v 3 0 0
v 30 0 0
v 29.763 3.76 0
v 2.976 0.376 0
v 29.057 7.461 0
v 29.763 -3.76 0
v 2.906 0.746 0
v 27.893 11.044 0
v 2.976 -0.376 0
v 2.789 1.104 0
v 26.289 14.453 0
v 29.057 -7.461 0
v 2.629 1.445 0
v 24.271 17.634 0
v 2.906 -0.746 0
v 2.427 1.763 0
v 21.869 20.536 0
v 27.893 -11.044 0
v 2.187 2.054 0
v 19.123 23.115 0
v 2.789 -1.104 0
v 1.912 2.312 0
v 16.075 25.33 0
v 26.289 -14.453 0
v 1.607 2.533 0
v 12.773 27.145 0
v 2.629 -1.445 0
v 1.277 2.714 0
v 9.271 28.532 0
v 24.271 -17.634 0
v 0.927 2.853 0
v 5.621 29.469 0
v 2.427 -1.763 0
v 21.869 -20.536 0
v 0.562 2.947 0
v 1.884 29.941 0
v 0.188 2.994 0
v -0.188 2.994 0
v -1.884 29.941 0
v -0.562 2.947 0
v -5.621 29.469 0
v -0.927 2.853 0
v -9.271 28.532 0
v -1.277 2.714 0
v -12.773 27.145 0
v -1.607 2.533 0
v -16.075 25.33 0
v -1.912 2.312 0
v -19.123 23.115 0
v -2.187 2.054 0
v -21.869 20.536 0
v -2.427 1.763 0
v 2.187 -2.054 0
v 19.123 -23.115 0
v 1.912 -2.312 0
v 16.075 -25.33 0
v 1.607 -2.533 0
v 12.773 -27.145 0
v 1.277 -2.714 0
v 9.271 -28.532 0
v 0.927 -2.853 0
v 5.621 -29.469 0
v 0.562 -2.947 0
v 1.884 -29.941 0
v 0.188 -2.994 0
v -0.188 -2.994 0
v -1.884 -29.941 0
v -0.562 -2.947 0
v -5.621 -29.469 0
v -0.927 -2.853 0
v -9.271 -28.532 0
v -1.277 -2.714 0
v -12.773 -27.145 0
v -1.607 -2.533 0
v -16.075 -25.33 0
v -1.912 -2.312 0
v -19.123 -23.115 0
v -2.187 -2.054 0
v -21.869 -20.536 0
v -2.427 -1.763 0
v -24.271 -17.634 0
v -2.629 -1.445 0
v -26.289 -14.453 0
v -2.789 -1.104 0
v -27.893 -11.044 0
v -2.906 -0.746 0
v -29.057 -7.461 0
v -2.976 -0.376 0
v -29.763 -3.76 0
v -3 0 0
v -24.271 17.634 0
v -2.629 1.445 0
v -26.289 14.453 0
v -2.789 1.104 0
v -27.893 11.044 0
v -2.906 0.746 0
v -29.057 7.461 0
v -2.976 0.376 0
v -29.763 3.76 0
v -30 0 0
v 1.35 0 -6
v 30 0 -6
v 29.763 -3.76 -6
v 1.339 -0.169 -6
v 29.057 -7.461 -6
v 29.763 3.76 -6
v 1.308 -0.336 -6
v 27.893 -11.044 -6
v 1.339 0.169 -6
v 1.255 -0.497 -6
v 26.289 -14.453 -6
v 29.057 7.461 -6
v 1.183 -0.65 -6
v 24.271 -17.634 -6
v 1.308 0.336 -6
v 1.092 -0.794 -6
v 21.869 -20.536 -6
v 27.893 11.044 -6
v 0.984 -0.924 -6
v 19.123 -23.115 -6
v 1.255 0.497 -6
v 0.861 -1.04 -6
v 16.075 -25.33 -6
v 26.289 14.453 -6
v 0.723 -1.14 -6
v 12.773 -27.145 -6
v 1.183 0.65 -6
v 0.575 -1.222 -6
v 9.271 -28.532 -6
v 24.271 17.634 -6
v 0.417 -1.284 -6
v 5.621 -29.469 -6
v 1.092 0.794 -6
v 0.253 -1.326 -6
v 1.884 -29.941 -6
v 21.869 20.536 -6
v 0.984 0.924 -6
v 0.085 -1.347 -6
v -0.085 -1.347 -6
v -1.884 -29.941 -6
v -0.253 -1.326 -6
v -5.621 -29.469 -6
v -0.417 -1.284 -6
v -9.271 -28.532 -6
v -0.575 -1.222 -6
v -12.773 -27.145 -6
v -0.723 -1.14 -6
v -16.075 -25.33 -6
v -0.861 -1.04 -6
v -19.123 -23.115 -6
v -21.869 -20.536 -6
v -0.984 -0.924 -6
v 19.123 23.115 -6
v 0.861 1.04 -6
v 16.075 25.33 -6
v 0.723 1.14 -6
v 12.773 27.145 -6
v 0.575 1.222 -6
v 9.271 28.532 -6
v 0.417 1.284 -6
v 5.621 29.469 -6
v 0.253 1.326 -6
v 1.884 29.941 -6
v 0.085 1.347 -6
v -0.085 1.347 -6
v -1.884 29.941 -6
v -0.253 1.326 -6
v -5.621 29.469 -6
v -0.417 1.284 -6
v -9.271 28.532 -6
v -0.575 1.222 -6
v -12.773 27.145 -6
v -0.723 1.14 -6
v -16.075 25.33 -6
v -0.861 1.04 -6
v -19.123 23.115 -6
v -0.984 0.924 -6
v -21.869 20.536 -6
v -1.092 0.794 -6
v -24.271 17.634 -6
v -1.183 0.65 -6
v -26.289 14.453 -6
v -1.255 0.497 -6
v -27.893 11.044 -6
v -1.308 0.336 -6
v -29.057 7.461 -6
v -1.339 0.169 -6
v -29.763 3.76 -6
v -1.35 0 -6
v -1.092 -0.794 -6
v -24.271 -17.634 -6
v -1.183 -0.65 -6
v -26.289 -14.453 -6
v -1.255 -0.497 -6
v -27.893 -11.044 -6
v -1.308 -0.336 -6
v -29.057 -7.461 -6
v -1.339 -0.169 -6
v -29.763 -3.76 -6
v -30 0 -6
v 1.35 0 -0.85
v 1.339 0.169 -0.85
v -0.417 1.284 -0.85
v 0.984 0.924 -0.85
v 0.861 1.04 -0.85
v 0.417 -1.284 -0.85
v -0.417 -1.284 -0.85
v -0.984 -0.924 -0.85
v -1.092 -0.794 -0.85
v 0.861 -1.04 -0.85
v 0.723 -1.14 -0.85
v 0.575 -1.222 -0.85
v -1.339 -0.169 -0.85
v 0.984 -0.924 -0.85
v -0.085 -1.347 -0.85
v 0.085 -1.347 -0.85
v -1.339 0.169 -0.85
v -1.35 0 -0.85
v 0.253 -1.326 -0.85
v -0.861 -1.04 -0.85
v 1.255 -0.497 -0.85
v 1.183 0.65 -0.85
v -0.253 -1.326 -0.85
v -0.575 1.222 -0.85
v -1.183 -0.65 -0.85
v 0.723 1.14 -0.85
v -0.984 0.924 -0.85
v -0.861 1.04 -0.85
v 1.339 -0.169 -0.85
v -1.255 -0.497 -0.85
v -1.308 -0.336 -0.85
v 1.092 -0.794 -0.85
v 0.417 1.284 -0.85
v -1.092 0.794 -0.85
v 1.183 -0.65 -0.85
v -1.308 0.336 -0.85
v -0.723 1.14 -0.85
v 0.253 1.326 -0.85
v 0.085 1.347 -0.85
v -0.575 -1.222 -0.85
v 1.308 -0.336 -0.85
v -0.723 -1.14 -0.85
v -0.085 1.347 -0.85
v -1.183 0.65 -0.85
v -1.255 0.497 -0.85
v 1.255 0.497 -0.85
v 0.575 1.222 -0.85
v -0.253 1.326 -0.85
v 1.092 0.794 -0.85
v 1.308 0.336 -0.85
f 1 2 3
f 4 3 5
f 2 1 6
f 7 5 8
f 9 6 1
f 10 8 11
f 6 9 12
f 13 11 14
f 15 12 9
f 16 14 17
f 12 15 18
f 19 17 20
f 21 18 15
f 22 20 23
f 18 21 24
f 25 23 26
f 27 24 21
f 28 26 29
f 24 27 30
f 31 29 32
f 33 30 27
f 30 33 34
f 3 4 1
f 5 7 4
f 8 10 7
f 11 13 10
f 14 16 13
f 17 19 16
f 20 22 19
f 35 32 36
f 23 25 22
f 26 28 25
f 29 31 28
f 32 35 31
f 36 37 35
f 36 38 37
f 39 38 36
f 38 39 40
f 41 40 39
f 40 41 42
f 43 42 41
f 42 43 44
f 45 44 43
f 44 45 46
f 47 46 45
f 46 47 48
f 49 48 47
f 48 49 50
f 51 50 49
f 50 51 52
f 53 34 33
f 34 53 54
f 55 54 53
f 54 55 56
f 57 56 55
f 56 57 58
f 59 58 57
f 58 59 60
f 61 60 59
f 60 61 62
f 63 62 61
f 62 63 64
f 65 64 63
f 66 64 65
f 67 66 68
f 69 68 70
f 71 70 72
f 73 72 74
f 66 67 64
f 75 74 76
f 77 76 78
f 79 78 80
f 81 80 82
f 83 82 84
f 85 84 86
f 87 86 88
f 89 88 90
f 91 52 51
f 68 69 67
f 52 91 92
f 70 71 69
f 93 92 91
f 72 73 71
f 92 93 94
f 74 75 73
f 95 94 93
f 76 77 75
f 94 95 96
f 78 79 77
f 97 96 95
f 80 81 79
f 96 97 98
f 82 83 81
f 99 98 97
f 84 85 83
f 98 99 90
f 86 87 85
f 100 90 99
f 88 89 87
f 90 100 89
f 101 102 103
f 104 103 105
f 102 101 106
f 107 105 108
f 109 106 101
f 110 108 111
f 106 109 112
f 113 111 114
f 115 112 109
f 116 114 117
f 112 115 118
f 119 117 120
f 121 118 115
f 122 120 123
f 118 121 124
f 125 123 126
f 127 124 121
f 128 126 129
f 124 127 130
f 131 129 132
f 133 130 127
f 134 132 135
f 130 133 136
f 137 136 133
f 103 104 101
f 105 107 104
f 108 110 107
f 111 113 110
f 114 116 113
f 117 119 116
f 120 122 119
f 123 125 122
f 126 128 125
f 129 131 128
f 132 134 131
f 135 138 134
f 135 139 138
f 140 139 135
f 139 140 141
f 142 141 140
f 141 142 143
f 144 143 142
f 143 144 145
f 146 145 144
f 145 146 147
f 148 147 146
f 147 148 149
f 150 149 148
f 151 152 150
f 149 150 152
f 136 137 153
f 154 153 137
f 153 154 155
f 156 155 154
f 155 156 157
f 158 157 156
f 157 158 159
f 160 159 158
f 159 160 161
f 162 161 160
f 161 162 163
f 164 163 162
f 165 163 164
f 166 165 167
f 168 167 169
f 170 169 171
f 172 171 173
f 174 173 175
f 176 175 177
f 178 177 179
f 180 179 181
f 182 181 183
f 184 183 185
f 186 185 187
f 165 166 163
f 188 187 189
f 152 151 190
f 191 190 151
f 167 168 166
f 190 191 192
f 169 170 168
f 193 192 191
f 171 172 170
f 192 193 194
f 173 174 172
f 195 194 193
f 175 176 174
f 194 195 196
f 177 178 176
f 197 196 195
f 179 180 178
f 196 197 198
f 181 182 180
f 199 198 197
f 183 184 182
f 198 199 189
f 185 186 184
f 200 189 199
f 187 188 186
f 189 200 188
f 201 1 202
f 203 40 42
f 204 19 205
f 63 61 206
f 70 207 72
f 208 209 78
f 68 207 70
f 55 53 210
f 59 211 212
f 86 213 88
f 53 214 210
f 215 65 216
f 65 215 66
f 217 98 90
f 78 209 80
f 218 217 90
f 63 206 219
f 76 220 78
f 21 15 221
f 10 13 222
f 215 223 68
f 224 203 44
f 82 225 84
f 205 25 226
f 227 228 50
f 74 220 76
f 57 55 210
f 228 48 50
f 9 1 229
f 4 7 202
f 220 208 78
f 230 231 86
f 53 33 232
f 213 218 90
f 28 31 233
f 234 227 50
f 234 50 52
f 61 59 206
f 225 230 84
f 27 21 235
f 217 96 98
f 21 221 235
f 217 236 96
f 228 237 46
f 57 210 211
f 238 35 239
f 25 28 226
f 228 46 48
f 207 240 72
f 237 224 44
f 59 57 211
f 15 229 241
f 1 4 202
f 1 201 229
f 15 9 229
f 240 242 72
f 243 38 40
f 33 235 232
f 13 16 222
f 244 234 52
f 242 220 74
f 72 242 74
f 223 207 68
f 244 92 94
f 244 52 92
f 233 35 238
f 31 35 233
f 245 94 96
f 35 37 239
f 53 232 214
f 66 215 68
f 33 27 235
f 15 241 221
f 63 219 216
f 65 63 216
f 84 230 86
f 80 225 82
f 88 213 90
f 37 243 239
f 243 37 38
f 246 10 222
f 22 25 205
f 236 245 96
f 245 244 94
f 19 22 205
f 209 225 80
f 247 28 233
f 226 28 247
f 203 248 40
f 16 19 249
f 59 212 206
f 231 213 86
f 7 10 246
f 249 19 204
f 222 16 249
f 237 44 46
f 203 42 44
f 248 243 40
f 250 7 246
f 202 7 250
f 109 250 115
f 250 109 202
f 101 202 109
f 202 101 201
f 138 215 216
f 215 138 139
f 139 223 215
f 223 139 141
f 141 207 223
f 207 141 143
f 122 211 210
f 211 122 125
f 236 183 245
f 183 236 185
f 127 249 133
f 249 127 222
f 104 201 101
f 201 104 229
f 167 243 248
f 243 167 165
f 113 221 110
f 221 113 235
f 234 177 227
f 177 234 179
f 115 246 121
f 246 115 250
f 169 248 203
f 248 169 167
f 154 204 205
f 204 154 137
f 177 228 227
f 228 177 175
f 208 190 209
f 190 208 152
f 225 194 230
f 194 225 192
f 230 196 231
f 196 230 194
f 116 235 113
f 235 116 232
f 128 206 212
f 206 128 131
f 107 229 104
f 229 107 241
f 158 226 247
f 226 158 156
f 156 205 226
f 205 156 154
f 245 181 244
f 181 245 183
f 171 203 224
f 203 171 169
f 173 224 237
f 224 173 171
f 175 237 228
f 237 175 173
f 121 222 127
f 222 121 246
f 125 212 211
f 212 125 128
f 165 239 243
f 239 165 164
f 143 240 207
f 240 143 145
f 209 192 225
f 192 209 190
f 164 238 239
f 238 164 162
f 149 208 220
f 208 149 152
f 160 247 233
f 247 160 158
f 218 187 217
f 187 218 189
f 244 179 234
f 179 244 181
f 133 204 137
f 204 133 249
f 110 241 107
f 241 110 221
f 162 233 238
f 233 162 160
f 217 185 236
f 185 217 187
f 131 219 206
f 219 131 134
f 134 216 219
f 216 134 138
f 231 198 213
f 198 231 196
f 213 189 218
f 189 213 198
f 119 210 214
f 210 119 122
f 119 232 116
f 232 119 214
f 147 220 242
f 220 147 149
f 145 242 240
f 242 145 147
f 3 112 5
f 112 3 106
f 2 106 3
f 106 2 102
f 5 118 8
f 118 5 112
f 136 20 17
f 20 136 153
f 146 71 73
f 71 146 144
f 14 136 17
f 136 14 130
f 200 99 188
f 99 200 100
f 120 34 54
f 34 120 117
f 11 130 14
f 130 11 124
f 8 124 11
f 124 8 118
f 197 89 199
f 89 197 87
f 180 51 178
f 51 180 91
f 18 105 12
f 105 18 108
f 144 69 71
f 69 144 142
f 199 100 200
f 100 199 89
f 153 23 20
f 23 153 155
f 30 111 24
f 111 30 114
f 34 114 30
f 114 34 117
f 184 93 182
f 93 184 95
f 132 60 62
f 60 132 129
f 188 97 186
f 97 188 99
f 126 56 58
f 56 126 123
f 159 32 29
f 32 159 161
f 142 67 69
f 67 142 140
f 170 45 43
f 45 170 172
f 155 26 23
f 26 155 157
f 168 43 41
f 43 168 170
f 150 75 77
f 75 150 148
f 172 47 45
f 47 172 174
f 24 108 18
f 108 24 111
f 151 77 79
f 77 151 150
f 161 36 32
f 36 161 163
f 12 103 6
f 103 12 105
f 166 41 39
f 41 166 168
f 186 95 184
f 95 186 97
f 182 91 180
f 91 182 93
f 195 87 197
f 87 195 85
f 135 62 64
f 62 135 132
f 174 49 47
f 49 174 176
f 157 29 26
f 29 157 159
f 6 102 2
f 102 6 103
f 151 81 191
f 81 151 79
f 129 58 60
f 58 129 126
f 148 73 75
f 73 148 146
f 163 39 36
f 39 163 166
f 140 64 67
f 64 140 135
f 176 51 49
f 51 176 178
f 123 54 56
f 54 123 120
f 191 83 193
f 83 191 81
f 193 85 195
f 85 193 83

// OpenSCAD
$fn = 50;


difference() {
	union() {
		translate(v = [0, 0, -6.0000000000]) {
			cylinder(h = 6, r = 30.0000000000);
		}
	}
	union() {
		translate(v = [0, 0, 0]) {
			rotate(a = [0, 0, 0]) {
				difference() {
					union() {
						translate(v = [0, 0, -6.0000000000]) {
							cylinder(h = 6, r = 1.0000000000);
						}
						translate(v = [0, 0, -0.8500000000]) {
							cylinder(h = 0.8500000000, r1 = 1.3500000000, r2 = 3.0000000000);
						}
						translate(v = [0, 0, -6.0000000000]) {
							cylinder(h = 6, r = 1.3500000000);
						}
						translate(v = [0, 0, -6.0000000000]) {
							cylinder(h = 6, r = 1.0000000000);
						}
					}
					union();
				}
			}
		}
	}
}
